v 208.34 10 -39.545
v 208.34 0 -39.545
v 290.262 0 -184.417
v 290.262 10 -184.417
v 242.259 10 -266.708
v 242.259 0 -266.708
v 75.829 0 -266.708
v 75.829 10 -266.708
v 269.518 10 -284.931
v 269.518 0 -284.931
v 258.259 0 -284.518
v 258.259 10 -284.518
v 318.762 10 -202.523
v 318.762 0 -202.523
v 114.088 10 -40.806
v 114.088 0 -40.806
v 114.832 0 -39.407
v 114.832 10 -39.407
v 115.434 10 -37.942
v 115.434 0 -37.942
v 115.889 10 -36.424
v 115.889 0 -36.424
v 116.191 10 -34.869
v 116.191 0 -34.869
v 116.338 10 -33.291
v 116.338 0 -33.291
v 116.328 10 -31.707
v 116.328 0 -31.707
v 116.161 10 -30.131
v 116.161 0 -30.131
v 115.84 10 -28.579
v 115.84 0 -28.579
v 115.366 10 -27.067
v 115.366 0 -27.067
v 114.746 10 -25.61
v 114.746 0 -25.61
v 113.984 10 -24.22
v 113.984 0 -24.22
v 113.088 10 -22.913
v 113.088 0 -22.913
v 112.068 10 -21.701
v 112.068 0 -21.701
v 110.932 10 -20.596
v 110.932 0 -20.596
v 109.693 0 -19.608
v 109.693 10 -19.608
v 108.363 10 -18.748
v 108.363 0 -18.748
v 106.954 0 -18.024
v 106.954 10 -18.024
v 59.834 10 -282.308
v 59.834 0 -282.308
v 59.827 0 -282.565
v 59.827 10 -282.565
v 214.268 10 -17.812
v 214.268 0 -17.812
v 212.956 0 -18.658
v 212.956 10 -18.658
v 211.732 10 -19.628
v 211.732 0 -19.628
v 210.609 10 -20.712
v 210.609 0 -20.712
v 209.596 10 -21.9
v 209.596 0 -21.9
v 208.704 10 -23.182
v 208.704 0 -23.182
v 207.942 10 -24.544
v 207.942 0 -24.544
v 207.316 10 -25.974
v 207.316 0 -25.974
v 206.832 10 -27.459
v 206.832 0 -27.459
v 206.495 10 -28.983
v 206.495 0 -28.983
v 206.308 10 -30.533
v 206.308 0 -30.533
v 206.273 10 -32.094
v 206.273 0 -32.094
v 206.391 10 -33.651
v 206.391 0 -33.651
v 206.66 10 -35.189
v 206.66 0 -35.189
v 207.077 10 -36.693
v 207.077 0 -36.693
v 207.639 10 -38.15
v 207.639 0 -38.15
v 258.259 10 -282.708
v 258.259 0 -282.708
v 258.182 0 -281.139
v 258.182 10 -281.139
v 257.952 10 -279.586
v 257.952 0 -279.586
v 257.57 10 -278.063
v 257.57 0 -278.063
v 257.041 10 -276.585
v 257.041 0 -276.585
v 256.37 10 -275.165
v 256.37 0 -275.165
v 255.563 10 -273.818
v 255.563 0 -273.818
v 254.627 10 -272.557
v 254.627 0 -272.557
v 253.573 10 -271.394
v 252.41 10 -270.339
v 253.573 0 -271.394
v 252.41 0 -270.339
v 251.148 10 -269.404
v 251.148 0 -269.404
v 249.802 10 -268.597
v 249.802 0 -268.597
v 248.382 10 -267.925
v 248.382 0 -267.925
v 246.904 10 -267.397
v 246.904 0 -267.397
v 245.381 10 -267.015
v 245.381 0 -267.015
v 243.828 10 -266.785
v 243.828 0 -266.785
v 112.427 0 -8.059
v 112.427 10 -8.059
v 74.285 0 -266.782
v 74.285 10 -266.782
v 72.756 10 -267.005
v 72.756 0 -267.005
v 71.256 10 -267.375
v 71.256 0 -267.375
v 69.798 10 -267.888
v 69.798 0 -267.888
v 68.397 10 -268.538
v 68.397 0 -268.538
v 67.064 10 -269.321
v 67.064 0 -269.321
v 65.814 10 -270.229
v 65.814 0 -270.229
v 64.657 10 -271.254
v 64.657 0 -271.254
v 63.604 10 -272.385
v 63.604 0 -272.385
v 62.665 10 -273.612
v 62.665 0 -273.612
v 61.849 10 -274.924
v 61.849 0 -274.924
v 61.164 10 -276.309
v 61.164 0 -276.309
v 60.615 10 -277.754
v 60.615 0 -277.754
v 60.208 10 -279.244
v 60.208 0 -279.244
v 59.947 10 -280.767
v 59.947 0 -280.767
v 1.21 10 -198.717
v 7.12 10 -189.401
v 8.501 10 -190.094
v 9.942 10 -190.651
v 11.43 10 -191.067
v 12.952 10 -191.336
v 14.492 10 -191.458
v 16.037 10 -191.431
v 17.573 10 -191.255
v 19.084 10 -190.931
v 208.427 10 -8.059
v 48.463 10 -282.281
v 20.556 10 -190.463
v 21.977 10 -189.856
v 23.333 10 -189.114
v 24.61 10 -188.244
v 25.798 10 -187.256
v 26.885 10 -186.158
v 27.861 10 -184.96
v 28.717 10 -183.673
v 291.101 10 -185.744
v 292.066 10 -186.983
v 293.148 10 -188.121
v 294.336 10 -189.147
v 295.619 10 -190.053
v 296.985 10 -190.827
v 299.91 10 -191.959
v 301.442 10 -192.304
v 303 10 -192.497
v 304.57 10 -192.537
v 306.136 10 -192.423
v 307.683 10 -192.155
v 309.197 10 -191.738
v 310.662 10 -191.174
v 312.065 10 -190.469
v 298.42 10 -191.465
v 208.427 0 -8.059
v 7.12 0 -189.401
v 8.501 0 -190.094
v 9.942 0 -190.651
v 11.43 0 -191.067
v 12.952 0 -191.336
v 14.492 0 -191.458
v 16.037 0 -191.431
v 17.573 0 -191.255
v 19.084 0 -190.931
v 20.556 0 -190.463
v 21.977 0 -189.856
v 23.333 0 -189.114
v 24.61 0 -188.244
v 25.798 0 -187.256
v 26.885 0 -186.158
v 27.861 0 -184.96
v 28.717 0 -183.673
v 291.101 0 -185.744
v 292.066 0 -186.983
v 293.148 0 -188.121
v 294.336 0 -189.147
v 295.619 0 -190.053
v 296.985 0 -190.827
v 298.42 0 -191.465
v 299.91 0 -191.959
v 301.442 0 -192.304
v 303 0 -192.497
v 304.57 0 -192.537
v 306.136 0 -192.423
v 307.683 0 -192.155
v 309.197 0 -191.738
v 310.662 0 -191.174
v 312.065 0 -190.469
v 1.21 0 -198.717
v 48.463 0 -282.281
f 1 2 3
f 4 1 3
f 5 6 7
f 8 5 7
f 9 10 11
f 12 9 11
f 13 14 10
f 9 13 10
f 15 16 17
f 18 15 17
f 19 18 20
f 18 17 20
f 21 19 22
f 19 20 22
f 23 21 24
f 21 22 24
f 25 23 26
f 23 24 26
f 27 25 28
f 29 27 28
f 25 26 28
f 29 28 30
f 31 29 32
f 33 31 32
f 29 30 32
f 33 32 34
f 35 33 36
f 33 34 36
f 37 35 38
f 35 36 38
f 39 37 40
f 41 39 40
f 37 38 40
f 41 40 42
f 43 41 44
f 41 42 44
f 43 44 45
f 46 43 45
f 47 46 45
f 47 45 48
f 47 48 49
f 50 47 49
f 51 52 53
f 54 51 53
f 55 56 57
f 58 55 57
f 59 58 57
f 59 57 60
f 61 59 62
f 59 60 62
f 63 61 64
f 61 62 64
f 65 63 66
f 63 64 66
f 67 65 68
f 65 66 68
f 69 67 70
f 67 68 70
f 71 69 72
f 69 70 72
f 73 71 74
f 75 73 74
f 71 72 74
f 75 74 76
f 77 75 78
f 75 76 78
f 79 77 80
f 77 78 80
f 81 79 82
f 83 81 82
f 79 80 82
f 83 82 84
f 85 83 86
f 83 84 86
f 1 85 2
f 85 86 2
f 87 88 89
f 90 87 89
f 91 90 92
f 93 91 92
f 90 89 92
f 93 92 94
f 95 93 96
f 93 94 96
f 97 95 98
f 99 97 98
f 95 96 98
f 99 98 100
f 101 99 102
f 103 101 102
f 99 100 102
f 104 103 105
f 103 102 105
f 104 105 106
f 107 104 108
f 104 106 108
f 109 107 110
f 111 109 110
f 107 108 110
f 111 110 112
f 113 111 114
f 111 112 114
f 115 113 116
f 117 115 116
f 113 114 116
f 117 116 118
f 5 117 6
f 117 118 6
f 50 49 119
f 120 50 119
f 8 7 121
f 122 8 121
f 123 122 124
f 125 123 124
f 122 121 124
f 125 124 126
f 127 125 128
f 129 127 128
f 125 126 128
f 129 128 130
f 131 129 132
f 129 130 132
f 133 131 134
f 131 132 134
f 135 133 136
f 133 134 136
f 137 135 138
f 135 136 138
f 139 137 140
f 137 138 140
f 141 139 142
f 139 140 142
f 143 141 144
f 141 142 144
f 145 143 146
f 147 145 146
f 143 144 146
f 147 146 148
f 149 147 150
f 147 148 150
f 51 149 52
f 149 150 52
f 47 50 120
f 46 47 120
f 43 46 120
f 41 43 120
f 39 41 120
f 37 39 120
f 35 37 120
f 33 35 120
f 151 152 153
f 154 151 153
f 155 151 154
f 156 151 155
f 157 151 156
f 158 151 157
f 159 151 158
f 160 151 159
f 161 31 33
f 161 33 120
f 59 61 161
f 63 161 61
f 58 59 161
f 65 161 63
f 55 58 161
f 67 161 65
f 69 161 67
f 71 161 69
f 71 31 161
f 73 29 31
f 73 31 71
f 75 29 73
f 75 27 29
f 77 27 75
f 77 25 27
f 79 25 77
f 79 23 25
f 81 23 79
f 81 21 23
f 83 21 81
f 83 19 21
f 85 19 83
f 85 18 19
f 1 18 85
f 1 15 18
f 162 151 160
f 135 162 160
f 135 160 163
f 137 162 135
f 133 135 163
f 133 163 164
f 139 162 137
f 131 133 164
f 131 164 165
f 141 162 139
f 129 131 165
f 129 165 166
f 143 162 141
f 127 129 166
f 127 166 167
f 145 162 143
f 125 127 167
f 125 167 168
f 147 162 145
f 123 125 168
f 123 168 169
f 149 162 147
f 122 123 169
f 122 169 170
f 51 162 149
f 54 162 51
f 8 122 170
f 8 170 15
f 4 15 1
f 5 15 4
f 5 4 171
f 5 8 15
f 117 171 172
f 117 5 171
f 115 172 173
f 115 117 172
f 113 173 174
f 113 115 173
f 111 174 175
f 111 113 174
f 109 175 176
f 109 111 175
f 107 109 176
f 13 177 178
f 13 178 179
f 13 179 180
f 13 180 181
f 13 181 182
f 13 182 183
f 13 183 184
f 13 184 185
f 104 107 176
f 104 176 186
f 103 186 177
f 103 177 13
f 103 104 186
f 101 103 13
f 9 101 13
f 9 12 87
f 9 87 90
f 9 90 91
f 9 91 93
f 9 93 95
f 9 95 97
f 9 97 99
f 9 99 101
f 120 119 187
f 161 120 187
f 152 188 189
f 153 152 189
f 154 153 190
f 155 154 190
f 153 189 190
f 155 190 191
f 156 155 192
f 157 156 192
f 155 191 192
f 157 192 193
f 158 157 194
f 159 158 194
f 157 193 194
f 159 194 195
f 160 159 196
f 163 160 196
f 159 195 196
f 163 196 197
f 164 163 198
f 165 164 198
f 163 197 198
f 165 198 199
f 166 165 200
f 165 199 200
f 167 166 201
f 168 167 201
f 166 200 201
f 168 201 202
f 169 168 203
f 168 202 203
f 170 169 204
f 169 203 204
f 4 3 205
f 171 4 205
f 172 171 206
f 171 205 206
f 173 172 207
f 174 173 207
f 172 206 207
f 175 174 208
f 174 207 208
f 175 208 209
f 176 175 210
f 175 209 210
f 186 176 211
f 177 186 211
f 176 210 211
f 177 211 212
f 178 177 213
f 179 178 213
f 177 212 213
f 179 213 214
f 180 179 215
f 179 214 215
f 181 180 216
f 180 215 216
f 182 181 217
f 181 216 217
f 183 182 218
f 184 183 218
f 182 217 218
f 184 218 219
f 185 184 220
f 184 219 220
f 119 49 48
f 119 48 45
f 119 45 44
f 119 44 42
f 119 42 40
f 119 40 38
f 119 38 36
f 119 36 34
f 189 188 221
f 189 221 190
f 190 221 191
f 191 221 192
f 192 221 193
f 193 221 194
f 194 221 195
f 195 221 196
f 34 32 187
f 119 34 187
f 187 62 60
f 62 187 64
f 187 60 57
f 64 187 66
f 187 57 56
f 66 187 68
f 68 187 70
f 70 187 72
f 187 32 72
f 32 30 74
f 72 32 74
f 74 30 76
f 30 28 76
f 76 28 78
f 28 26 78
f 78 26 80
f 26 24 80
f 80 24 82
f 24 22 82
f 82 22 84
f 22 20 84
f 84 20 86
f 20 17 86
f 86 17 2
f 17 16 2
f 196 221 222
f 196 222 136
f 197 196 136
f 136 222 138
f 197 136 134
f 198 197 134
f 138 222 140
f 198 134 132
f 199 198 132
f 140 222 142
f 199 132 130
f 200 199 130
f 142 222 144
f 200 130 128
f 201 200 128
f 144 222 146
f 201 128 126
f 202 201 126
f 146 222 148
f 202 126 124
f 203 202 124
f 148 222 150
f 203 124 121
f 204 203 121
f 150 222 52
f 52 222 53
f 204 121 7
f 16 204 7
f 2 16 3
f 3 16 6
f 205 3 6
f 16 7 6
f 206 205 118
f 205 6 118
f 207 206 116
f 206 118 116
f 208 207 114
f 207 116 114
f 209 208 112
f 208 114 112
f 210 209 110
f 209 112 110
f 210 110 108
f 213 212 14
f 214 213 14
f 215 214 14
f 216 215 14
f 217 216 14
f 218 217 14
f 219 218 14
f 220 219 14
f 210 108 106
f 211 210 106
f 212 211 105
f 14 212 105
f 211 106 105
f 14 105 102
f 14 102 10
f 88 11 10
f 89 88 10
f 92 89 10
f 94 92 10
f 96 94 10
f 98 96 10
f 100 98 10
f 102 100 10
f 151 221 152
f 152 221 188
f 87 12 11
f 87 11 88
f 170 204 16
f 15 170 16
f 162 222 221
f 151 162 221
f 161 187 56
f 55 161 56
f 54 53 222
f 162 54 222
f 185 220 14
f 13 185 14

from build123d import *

# Parameters (mm, degrees)
BOSS_EXTRU_1_DEPTH = 10


with BuildPart() as part:
    # Esquisse1 → Boss.-Extru.1 (new body)
    with BuildSketch(Plane(origin=(0, 0, 0), x_dir=(1, 0, 0), z_dir=(0, 1, 0))):
        with BuildLine():
            Line((112.426746773, 8.058530984), (208.426746773, 8.058530984))
            Line((208.426746773, 8.058530984), (214.268189678, 17.812491045))
            ThreePointArc((214.268189678, 17.812491045), (206.831645665, 27.458673867), (208.340233589, 39.544830921))
            Line((208.340233589, 39.544830921), (290.262052013, 184.417099293))
            ThreePointArc((290.262052013, 184.417099293), (299.910234809, 191.958577714), (312.065160821, 190.468912764))
            Line((312.065160821, 190.468912764), (318.76181291, 202.523064381))
            Line((318.76181291, 202.523064381), (269.51839591, 284.931109389))
            Line((269.51839591, 284.931109389), (258.259283583, 284.517680144))
            Line((258.259283583, 284.517680144), (258.259283583, 282.707559459))
            ThreePointArc((258.259283583, 282.707559459), (253.572992082, 271.39385096), (242.259283583, 266.707559459))
            Line((242.259283583, 266.707559459), (75.828641942, 266.707559459))
            ThreePointArc((75.828641942, 266.707559459), (64.656934191, 271.253610536), (59.833620697, 282.308441218))
            Line((59.833620697, 282.308441218), (59.827222367, 282.56486004))
            Line((59.827222367, 282.56486004), (48.463462476, 282.281304065))
            Line((48.463462476, 282.281304065), (1.209576466, 198.716537226))
            Line((1.209576466, 198.716537226), (7.119810651, 189.400838648))
            ThreePointArc((7.119810651, 189.400838648), (19.083596298, 190.931024082), (28.716557185, 183.672945892))
            Line((28.716557185, 183.672945892), (114.087531018, 40.806031234))
            ThreePointArc((114.087531018, 40.806031234), (115.621763688, 27.817531222), (106.953563168, 18.023793314))
            Line((106.953563168, 18.023793314), (112.426746773, 8.058530984))
        make_face()
    extrude(amount=BOSS_EXTRU_1_DEPTH)


solid = part.part
